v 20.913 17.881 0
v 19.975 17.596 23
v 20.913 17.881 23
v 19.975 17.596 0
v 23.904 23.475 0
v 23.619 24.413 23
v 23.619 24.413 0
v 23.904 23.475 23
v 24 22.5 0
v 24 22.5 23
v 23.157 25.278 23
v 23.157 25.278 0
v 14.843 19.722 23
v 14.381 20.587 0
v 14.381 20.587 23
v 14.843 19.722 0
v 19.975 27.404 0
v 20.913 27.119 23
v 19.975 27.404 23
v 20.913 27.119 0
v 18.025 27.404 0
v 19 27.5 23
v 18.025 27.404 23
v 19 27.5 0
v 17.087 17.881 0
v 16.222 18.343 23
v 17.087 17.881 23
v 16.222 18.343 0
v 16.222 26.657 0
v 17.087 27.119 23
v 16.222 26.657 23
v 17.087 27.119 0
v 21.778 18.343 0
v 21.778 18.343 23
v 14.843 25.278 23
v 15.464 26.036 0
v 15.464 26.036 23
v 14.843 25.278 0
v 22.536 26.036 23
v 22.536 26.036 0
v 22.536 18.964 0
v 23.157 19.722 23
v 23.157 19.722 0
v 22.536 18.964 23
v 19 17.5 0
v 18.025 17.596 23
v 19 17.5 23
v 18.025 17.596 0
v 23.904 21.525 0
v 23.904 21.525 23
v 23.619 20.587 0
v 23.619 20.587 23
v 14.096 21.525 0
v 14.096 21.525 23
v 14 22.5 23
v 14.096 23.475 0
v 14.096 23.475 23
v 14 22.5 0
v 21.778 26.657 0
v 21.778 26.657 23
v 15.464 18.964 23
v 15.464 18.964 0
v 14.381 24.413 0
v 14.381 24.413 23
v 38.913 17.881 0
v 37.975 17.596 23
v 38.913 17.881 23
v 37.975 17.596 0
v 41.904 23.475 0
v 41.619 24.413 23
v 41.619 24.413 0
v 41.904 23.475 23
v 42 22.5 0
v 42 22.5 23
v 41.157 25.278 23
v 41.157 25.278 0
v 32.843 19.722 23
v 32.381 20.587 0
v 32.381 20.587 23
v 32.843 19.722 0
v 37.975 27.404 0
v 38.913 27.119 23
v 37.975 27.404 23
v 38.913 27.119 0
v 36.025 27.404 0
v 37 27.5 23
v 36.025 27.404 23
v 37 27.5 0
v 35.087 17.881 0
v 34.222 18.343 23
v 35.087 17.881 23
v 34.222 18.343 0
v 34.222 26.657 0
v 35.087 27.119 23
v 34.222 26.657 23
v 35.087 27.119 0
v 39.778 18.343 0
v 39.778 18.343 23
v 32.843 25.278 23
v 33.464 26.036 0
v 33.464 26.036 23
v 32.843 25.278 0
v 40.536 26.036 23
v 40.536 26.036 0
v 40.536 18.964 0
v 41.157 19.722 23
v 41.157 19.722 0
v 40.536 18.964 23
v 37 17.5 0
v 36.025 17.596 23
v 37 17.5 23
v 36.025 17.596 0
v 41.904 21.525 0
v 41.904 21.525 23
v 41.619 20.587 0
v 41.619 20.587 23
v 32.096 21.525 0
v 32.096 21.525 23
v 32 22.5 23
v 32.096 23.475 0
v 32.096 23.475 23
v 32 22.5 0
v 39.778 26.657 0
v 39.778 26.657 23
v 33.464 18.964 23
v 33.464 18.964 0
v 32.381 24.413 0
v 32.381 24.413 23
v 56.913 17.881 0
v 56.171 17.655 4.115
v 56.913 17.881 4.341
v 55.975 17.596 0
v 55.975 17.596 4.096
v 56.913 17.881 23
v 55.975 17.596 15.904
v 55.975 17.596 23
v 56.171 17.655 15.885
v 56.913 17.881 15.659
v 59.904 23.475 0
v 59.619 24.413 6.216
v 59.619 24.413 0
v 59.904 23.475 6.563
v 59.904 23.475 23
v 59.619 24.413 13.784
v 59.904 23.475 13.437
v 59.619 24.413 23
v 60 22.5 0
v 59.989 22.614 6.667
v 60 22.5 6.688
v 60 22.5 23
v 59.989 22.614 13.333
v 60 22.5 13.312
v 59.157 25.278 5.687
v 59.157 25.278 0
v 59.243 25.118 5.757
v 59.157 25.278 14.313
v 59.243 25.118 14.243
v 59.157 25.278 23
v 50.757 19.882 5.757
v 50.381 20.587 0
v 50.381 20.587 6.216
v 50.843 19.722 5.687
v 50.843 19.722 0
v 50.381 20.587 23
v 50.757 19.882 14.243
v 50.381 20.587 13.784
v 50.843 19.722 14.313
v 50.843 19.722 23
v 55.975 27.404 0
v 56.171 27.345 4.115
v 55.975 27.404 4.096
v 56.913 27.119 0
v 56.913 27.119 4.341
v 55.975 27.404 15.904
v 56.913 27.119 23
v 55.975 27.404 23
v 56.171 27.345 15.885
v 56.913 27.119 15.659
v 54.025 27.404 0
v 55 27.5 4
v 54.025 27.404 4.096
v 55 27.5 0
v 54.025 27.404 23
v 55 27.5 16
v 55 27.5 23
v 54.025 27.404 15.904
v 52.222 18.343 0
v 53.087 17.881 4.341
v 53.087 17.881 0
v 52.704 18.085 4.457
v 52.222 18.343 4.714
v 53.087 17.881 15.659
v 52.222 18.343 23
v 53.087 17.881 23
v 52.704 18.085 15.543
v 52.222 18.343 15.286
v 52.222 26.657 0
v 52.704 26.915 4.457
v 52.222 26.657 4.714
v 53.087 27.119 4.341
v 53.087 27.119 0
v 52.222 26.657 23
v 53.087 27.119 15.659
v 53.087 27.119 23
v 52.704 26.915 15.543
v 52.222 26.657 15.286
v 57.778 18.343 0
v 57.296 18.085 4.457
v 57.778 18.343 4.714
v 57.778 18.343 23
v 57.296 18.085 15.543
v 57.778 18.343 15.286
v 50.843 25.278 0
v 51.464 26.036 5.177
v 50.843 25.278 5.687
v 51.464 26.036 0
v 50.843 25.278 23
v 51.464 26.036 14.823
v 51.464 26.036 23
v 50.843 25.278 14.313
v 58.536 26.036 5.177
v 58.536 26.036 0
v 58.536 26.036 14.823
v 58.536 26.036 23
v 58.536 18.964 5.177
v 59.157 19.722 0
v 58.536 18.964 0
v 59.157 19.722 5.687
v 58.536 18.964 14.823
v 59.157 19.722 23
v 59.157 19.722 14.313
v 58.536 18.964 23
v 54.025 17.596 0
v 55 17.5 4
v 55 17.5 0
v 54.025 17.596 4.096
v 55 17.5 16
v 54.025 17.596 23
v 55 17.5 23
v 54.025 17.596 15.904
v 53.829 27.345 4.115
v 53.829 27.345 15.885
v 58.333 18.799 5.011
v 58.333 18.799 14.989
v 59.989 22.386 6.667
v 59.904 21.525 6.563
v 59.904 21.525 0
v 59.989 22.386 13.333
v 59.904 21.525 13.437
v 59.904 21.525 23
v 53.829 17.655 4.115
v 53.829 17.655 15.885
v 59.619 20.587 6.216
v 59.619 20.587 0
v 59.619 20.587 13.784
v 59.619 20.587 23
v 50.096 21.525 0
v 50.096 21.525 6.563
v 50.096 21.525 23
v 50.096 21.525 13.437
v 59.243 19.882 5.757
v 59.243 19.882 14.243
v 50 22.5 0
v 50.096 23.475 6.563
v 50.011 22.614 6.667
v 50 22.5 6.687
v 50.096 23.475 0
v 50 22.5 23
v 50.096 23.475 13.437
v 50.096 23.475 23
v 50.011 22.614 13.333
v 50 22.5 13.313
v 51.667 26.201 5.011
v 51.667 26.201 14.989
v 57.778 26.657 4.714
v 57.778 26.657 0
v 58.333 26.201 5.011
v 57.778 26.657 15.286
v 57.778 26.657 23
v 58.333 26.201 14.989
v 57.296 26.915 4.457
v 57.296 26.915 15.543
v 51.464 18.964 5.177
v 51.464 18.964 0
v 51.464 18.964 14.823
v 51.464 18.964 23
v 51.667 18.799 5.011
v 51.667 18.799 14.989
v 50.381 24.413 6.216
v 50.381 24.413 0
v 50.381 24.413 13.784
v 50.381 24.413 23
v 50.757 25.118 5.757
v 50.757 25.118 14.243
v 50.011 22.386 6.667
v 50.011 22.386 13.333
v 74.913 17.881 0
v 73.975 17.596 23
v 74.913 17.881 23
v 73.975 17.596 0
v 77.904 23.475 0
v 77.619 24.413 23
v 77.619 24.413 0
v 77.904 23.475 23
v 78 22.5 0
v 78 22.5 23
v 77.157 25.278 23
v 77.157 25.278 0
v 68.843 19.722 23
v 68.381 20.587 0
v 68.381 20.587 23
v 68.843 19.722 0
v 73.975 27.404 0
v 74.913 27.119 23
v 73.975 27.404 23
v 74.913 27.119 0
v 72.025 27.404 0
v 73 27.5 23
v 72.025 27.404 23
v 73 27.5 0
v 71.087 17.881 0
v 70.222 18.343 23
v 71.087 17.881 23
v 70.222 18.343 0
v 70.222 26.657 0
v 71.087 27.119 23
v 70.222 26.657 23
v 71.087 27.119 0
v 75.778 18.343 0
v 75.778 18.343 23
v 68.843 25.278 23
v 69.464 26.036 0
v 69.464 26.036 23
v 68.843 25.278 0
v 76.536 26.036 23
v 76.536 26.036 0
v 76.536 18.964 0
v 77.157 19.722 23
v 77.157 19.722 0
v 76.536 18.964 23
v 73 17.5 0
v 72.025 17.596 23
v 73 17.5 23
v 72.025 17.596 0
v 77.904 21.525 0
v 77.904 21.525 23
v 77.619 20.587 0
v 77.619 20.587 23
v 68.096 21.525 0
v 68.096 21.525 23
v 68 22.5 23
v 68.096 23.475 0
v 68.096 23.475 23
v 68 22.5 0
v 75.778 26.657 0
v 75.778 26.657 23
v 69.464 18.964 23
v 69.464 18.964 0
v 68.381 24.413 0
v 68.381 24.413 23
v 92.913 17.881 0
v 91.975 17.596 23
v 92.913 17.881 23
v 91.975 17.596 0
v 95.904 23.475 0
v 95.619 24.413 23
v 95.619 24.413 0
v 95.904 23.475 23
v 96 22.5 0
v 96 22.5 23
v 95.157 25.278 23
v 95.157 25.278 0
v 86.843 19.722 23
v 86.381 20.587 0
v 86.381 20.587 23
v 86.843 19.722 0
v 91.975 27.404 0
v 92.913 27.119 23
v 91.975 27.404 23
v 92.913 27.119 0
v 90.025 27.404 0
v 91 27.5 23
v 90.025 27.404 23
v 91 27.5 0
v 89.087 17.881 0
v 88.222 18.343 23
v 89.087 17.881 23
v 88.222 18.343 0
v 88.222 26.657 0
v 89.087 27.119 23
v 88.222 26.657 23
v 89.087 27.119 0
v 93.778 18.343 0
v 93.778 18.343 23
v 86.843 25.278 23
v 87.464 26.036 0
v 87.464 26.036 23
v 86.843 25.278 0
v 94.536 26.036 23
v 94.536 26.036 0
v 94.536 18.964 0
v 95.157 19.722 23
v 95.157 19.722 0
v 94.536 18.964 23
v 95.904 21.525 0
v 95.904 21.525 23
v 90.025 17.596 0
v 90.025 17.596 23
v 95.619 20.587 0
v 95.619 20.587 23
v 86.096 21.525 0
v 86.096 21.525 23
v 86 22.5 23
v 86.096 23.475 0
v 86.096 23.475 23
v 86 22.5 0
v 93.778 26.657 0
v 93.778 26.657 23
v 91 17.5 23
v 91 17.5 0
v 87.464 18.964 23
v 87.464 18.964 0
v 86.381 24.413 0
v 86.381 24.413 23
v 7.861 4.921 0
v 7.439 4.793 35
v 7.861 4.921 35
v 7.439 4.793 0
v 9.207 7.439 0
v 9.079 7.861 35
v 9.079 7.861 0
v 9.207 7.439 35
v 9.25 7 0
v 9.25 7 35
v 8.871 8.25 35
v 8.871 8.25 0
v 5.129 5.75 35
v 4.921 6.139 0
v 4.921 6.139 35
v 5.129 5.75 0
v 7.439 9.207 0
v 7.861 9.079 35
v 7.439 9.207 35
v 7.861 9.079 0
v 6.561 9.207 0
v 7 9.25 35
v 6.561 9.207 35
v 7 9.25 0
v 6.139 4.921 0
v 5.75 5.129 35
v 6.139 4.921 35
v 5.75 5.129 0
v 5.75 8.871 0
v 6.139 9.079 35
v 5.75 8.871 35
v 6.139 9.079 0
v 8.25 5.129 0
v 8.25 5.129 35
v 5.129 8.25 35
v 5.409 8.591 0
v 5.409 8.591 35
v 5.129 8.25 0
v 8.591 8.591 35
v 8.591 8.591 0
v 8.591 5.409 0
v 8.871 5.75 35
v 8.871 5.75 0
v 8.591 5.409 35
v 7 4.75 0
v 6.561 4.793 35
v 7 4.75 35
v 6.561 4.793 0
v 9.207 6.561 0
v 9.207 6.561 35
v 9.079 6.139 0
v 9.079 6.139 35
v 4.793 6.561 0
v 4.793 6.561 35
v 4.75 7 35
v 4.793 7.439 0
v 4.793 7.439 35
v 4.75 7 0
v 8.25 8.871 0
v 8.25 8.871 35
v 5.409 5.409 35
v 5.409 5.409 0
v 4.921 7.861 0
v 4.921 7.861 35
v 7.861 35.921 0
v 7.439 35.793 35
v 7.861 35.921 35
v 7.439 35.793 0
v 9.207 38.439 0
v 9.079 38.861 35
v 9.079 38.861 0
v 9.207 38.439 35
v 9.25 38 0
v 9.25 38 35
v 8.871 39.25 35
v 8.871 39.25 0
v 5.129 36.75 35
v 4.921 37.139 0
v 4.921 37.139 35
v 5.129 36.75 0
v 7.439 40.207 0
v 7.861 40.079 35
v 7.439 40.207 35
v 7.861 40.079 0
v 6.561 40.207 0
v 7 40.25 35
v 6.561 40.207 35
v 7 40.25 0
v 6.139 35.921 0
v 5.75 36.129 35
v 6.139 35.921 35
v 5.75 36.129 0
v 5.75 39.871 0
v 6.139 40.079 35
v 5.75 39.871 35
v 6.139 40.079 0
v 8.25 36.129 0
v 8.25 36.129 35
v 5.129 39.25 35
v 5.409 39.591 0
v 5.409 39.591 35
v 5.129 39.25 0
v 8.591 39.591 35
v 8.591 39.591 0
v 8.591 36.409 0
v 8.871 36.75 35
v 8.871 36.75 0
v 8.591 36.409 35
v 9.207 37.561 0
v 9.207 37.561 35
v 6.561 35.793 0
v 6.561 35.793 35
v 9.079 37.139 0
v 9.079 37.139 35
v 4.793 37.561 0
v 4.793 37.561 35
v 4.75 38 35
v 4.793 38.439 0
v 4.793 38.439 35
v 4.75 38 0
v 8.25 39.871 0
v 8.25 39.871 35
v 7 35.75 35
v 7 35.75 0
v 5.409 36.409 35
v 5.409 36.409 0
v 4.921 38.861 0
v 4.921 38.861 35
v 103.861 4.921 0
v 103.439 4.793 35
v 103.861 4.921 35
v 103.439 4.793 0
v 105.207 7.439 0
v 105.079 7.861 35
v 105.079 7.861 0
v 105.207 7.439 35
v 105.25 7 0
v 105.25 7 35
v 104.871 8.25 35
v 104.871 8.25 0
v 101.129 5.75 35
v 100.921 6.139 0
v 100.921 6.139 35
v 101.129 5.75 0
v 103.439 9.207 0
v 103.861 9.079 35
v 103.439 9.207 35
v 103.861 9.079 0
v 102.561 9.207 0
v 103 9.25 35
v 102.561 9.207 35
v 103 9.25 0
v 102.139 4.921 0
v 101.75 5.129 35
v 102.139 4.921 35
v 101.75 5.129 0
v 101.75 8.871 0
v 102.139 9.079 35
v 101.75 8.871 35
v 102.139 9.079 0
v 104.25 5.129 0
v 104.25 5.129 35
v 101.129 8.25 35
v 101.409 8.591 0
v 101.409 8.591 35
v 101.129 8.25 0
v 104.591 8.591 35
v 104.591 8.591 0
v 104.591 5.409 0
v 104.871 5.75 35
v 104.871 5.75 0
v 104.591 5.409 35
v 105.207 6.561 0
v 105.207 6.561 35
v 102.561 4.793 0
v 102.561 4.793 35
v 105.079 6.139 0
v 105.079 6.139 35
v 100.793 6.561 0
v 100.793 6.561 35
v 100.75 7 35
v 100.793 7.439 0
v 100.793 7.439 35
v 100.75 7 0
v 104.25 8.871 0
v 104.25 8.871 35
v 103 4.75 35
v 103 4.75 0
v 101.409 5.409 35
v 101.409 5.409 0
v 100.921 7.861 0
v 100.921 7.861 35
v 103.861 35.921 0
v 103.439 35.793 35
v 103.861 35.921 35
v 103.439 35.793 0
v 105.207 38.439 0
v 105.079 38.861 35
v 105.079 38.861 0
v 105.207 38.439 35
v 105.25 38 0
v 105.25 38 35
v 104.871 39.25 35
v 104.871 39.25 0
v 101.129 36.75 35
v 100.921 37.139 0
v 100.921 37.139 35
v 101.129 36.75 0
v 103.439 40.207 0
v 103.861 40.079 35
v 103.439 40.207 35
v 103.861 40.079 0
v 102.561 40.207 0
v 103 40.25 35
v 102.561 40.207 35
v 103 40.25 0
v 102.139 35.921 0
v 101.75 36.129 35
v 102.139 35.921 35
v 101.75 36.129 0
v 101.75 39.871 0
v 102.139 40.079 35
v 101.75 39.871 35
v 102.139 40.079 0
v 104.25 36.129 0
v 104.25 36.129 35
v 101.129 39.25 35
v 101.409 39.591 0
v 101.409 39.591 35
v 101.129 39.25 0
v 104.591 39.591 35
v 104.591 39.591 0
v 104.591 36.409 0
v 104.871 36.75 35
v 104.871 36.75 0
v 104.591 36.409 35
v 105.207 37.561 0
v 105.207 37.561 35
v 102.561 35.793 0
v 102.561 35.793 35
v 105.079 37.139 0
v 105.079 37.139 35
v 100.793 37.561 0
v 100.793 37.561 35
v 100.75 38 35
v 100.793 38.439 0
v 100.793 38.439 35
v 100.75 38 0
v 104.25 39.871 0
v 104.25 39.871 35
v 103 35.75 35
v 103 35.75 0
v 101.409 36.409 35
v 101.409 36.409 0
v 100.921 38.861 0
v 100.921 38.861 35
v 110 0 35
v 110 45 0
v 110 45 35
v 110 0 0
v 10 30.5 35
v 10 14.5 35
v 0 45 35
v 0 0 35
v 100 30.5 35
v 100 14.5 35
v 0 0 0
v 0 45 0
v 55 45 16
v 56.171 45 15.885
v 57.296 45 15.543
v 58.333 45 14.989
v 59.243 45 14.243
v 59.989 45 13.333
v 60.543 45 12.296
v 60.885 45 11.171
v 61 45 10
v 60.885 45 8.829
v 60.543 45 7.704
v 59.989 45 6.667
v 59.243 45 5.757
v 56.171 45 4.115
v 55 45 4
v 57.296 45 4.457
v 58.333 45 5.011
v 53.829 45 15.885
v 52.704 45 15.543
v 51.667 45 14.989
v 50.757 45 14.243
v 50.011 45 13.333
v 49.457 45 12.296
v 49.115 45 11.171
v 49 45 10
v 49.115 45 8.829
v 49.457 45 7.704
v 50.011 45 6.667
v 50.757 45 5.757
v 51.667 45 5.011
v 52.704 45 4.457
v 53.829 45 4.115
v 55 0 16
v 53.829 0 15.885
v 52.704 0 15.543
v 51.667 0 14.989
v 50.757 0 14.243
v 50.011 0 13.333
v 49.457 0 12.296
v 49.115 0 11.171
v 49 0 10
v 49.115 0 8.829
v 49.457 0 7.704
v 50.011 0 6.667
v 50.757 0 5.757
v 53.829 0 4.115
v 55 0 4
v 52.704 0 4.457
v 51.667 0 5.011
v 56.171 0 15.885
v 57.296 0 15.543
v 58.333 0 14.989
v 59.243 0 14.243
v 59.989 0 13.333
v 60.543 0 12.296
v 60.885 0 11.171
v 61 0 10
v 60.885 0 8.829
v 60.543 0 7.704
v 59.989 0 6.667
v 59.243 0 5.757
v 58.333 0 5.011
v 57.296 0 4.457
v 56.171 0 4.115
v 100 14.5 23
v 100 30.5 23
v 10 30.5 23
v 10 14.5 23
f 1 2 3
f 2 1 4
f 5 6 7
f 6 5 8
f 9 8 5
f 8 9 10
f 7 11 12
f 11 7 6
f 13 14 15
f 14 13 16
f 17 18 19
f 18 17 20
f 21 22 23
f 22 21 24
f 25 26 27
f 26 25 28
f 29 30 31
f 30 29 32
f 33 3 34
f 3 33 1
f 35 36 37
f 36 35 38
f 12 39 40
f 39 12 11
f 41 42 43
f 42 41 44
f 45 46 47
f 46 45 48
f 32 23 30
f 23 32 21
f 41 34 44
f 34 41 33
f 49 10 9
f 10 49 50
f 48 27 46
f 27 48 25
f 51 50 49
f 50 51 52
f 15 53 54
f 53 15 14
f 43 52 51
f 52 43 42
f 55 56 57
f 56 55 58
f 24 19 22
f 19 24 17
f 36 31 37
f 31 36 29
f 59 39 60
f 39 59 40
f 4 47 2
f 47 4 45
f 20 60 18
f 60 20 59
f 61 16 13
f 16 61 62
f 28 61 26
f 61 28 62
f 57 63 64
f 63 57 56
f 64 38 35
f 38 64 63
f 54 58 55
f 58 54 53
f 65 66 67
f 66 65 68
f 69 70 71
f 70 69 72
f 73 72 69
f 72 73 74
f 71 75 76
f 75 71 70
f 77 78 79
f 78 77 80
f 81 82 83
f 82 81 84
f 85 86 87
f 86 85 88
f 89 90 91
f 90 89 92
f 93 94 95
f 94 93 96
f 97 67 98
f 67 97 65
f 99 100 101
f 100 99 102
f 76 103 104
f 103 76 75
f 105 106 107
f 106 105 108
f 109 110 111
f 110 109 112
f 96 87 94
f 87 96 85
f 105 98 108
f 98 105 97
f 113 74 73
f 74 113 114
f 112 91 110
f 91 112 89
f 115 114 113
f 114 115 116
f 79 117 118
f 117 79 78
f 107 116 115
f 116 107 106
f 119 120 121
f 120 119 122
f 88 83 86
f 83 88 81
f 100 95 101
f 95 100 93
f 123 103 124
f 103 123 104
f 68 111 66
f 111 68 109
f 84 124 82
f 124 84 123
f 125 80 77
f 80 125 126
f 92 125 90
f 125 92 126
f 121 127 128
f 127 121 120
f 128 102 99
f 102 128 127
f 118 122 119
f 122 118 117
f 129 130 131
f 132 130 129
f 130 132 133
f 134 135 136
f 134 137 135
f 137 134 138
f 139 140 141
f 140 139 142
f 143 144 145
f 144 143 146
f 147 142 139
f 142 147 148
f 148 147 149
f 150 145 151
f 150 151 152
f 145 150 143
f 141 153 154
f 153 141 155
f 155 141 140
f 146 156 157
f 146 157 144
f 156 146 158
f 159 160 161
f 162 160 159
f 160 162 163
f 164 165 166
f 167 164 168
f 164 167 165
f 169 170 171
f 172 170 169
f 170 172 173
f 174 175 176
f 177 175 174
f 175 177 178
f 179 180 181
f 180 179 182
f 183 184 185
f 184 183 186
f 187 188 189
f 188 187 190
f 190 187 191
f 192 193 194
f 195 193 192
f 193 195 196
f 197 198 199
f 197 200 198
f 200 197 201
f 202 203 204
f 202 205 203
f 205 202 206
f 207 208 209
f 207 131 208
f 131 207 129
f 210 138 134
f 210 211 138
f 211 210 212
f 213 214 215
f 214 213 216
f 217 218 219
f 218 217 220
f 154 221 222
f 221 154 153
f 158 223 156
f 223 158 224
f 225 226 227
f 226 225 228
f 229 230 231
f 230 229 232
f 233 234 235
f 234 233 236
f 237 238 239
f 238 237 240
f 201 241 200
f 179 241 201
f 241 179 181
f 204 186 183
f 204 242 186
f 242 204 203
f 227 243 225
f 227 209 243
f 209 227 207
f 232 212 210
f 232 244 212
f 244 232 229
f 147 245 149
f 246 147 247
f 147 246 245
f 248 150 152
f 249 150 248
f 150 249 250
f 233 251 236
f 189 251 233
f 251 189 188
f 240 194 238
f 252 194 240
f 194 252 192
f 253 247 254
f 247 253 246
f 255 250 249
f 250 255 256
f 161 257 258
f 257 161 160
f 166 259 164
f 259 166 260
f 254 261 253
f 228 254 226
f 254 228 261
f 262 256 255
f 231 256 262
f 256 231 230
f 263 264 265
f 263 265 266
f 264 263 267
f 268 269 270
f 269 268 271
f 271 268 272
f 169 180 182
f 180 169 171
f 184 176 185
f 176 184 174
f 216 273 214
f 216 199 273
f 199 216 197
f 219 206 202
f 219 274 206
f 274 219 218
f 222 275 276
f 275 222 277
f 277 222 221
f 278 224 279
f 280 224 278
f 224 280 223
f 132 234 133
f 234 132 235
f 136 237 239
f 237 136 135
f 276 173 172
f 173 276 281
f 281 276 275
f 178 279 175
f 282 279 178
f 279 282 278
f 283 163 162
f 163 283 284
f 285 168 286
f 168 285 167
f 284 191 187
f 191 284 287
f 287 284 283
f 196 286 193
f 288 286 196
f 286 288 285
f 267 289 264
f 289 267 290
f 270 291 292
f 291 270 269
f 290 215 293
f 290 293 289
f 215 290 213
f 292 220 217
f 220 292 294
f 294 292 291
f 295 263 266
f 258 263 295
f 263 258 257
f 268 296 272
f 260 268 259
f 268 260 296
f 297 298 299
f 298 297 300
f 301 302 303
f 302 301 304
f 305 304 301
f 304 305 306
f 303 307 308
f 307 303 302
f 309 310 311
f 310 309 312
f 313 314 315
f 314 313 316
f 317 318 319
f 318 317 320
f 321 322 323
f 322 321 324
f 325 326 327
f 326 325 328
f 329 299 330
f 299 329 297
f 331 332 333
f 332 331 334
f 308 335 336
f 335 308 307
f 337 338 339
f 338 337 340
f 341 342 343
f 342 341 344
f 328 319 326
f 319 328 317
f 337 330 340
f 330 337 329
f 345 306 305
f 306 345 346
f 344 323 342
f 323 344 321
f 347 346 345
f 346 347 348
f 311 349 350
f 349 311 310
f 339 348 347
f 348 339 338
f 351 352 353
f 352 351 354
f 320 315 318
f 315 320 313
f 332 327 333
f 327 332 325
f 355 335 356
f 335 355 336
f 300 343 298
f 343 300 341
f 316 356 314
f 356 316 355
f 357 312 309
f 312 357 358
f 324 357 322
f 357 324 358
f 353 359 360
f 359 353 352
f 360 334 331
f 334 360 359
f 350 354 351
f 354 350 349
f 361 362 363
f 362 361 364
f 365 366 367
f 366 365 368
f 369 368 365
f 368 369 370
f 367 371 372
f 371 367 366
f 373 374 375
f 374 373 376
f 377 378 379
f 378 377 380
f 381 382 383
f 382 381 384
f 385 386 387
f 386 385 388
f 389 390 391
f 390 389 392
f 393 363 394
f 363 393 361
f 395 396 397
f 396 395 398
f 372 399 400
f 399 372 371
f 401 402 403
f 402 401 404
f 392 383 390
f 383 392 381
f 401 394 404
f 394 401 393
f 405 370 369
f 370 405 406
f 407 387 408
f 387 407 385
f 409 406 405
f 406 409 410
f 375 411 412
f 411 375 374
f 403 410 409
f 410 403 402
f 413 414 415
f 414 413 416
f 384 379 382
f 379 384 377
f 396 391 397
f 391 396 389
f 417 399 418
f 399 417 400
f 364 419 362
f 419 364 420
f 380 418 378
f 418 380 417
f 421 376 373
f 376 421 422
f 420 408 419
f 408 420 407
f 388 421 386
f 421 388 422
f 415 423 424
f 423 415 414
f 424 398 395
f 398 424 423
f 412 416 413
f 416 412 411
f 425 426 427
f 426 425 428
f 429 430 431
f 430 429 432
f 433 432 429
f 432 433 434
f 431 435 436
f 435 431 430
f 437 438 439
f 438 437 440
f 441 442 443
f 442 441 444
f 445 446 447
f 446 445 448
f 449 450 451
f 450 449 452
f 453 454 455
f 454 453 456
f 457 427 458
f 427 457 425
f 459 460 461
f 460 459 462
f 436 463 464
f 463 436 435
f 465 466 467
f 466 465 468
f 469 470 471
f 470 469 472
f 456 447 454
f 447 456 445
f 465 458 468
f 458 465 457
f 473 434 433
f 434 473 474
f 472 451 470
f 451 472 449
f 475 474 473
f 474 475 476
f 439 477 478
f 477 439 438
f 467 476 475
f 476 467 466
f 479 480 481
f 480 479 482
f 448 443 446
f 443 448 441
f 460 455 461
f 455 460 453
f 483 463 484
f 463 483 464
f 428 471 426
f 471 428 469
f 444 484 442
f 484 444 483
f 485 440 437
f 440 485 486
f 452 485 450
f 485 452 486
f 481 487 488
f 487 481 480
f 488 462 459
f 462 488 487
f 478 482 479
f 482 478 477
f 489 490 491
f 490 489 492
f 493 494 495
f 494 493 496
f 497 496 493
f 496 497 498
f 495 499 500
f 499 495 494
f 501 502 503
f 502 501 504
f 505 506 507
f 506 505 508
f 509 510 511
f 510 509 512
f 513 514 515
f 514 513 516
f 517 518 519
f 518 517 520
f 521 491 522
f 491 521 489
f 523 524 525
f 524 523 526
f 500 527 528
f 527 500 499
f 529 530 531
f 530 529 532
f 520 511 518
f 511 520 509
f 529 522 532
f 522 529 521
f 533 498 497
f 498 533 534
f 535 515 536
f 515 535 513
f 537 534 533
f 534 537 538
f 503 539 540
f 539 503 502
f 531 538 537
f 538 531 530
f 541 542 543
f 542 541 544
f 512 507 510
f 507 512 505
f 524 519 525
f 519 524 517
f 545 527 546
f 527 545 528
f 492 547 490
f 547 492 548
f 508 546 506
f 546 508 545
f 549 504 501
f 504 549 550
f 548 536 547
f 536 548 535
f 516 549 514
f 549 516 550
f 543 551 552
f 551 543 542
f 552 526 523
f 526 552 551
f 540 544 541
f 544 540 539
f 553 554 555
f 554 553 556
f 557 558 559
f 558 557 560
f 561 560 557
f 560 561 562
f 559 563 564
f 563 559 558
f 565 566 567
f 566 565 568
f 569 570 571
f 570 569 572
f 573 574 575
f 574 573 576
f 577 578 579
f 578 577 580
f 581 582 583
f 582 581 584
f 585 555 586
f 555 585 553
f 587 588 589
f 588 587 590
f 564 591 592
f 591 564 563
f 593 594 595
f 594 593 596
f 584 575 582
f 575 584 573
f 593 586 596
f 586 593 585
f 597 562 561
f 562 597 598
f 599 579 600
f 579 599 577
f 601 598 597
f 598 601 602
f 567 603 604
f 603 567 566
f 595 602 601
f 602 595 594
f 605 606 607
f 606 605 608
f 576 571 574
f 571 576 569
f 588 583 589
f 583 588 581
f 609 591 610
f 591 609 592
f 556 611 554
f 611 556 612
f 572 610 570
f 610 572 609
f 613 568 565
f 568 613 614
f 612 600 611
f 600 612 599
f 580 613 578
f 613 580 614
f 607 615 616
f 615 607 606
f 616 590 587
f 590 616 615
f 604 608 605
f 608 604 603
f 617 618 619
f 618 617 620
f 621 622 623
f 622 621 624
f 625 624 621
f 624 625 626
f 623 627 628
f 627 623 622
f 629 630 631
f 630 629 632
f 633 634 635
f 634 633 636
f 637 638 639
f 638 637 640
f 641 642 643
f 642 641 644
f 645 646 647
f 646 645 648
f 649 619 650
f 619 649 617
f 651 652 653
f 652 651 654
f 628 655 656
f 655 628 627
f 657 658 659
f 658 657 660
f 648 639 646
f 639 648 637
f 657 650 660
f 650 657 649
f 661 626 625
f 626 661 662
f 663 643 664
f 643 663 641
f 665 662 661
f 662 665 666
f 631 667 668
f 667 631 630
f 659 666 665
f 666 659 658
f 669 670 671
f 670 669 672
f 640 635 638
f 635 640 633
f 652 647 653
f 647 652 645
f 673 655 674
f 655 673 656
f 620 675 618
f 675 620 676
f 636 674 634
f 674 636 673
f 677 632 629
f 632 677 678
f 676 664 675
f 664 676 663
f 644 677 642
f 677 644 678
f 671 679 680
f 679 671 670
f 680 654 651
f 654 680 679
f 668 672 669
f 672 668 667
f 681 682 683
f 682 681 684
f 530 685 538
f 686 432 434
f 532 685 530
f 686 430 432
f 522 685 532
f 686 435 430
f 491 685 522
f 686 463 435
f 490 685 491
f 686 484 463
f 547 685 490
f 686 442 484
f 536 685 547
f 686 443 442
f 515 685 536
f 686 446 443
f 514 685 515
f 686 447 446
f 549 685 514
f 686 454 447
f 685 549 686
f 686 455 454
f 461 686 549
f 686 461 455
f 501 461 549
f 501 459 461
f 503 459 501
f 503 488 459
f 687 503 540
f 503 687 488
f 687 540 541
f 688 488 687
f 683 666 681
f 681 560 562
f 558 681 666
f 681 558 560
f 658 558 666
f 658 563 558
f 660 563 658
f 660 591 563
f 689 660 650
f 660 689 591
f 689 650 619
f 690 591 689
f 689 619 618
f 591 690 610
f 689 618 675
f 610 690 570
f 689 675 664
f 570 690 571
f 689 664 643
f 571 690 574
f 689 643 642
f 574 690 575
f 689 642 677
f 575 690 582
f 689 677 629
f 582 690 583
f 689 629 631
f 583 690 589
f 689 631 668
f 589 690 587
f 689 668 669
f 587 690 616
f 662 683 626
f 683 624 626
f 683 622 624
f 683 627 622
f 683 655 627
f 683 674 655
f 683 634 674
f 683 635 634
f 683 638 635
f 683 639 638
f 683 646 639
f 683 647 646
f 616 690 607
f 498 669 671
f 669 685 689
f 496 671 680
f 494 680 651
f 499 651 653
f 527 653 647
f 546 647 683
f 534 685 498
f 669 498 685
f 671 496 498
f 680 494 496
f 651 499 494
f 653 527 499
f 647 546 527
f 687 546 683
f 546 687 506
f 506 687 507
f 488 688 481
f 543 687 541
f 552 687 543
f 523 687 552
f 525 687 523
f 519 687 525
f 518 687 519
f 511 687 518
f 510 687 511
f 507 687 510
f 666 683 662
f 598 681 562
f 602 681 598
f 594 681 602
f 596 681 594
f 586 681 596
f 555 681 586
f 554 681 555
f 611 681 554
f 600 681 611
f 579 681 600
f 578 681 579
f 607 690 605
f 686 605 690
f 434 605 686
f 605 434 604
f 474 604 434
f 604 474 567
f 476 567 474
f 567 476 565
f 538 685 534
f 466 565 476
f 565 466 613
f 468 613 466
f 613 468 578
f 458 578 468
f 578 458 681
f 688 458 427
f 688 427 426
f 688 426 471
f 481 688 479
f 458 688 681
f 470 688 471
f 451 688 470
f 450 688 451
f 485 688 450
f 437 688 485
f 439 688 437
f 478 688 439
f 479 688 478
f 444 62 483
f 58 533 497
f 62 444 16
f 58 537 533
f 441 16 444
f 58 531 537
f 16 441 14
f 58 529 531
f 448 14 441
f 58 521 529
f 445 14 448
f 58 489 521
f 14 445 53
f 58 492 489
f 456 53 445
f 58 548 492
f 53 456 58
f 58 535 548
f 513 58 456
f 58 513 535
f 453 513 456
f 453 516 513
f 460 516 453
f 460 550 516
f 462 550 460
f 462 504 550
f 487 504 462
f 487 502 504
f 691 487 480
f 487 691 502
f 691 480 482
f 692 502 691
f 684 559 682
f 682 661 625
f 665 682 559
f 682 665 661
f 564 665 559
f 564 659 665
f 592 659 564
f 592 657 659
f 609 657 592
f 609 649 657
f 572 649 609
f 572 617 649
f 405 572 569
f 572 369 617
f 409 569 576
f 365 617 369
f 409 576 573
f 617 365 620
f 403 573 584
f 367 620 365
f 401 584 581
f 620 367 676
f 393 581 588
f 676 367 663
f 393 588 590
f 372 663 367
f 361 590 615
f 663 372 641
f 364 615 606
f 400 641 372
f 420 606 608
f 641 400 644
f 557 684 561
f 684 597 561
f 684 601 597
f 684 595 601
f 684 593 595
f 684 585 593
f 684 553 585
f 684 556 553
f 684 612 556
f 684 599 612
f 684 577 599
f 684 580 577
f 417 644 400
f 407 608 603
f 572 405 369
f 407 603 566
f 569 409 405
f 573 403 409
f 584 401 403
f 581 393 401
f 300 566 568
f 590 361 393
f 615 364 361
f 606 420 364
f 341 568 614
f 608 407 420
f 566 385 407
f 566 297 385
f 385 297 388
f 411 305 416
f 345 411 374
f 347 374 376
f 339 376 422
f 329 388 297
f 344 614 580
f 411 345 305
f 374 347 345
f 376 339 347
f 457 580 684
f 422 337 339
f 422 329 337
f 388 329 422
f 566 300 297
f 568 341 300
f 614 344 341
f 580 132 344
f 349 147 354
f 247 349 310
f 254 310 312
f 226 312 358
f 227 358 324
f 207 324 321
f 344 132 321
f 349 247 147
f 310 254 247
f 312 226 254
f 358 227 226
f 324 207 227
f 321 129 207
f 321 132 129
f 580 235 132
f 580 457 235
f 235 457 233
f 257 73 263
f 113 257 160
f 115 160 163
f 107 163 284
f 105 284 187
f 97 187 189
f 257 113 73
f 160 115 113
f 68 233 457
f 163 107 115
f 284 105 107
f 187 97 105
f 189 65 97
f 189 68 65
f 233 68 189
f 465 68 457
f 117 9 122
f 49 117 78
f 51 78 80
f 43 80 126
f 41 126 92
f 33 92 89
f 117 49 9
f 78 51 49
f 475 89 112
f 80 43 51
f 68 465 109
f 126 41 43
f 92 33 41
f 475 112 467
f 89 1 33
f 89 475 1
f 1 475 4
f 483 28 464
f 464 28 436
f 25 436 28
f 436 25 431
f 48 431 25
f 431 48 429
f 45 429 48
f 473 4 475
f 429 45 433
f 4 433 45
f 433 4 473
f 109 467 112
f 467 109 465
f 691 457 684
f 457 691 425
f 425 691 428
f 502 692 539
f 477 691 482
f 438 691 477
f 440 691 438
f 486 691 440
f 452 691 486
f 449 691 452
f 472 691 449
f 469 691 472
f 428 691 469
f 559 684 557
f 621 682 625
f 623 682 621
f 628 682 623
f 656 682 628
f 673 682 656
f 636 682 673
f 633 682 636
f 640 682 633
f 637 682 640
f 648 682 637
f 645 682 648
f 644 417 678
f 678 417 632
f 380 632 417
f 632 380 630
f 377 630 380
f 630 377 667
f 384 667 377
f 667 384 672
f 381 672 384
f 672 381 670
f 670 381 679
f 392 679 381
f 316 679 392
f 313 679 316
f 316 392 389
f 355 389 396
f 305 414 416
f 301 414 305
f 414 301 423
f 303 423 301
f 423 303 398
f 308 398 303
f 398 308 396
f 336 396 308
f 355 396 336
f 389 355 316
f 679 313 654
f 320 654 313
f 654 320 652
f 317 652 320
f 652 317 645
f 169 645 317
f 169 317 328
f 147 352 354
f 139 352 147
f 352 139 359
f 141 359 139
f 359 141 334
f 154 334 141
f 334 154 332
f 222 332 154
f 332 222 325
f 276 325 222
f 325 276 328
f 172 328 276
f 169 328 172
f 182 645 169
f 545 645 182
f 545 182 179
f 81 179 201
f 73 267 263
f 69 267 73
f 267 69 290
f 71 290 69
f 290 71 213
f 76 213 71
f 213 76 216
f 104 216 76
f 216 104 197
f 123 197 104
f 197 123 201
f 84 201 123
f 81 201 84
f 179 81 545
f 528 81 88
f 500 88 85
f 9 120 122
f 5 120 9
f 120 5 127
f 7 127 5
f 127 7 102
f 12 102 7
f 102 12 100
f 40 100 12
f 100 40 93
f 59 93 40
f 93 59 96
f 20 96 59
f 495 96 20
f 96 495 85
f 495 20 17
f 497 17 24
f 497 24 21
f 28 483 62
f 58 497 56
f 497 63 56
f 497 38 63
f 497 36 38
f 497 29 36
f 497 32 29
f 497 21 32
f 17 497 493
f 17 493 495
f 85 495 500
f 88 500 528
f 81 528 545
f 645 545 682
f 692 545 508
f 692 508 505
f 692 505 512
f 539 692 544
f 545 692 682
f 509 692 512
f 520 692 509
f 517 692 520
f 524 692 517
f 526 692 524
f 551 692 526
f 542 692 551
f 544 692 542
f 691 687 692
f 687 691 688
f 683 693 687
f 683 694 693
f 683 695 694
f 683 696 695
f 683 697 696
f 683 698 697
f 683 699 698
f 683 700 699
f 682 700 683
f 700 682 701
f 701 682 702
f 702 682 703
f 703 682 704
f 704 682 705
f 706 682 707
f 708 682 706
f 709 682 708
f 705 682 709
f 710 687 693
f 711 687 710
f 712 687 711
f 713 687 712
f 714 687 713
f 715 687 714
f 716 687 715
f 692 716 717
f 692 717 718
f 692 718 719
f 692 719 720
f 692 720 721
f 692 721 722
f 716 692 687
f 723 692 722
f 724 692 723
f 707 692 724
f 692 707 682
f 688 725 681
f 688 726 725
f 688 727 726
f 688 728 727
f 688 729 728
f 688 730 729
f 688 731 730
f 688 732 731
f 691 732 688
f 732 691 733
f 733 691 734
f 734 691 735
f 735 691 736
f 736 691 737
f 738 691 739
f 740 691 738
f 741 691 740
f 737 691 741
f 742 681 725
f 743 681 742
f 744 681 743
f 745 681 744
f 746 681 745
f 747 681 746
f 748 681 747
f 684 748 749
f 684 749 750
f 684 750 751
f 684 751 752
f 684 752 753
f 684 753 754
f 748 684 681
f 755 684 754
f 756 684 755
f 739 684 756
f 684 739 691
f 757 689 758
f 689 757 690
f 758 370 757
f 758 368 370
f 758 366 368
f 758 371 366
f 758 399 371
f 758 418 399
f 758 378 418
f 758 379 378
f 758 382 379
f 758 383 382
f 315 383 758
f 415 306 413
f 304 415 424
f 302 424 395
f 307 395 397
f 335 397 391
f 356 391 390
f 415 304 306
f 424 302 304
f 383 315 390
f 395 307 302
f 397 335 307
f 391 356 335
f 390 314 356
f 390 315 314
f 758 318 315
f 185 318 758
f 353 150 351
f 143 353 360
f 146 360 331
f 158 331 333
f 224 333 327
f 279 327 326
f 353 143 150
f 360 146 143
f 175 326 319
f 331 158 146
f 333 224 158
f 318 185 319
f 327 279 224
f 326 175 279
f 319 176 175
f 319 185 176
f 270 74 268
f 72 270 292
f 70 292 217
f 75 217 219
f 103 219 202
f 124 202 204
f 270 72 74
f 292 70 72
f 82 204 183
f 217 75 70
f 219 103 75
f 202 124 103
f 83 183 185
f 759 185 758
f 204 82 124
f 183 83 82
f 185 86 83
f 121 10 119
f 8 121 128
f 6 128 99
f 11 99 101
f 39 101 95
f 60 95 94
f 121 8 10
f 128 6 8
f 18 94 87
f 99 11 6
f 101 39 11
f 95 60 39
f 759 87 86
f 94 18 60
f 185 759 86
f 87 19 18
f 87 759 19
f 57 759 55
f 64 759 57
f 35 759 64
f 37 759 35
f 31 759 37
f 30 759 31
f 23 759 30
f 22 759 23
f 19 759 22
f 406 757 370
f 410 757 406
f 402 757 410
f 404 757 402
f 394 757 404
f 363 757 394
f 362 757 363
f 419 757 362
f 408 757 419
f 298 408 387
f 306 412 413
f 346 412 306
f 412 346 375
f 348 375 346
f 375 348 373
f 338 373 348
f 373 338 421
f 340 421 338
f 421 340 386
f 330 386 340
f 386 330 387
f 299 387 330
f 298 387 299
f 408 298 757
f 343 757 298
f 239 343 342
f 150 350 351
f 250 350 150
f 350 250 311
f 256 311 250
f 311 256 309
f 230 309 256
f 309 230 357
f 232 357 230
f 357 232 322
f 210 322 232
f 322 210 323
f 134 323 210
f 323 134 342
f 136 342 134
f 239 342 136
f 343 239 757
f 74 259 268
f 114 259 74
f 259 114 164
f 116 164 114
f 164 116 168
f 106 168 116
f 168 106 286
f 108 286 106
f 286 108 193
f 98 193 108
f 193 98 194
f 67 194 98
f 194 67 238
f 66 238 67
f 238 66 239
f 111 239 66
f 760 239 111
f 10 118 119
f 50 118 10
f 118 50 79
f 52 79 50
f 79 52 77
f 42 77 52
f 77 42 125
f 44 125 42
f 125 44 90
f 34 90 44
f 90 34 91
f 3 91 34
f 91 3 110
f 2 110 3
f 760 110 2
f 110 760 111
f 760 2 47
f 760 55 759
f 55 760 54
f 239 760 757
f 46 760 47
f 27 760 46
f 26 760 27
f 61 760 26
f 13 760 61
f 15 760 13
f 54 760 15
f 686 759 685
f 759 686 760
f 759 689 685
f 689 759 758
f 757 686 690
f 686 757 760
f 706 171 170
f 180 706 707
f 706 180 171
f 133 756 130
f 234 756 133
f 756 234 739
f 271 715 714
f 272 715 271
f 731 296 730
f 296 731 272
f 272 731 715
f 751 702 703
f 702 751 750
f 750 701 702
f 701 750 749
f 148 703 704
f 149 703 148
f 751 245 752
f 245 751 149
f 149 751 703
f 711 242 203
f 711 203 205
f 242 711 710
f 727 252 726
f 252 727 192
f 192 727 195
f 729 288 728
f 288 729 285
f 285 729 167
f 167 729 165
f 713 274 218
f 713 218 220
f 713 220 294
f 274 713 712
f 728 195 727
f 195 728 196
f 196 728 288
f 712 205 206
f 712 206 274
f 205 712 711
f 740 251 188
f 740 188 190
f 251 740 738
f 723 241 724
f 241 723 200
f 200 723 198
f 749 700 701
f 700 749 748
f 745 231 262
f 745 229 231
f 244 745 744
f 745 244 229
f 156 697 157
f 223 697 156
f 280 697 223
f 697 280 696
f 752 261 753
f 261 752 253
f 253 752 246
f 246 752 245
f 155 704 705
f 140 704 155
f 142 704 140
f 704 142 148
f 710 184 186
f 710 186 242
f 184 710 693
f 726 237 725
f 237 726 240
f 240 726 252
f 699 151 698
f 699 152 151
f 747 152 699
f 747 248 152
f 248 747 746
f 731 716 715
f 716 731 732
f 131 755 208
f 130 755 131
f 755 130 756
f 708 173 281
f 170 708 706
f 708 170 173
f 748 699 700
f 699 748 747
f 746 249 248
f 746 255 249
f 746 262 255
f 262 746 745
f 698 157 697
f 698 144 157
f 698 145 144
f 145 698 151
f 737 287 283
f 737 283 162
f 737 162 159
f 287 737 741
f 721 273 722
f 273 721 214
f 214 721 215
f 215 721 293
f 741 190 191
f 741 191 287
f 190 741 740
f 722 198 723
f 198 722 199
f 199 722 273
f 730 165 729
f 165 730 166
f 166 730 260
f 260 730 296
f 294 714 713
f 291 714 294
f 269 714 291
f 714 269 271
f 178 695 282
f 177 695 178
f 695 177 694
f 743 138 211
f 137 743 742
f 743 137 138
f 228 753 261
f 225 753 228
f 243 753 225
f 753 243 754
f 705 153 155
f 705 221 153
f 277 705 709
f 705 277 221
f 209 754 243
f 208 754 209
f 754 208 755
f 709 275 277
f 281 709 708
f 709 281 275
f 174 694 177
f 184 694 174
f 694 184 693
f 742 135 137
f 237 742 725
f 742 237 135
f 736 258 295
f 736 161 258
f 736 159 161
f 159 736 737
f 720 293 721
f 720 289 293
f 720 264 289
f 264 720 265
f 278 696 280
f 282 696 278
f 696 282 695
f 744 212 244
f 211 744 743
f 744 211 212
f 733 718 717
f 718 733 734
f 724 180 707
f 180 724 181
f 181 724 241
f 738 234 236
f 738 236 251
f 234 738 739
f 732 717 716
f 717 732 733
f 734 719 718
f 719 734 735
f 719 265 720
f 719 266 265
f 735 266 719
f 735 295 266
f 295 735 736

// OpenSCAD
$fn = 32;

// ----------------------------------------------------------------------
// Manifold block: side_outlet manifold
// ----------------------------------------------------------------------

// --- parameters (mm) ---
block_l = 110;            // block length, X
block_w = 45;             // block width, Y
block_h = 35;             // block height, Z
port_d = 10;              // port bore diameter
port_pitch = 18;          // port pitch along X
gallery_d = 16;           // top gallery width, Y
gallery_depth = 12;       // gallery pocket depth
wall_p = 10;              // gallery end wall thickness, X
mnt_d = 4.5;              // mounting hole diameter
mnt_in = 7;               // mounting hole inset from the edges
out_d = 12;               // outlet bore diameter
out_z = 10;               // outlet axis height

n_ports = 5;  // ports in the row
port_x0 = (block_l - (n_ports - 1) * port_pitch) / 2;  // first port X

difference() {
  cube([block_l, block_w, block_h]);
  for (i = [0 : n_ports - 1])
    translate([port_x0 + i * port_pitch, block_w / 2, -1])
      cylinder(h = block_h + 2, d = port_d);
  translate([wall_p, block_w / 2 - gallery_d / 2, block_h - gallery_depth])
    cube([block_l - 2 * wall_p, gallery_d, gallery_depth + 1]);
  for (cx = [mnt_in, block_l - mnt_in])
    for (cy = [mnt_in, block_w - mnt_in])
      translate([cx, cy, -1]) cylinder(h = block_h + 2, d = mnt_d);
  translate([block_l / 2, -1, out_z]) rotate([-90, 0, 0])
    cylinder(h = block_w + 2, d = out_d);
}
